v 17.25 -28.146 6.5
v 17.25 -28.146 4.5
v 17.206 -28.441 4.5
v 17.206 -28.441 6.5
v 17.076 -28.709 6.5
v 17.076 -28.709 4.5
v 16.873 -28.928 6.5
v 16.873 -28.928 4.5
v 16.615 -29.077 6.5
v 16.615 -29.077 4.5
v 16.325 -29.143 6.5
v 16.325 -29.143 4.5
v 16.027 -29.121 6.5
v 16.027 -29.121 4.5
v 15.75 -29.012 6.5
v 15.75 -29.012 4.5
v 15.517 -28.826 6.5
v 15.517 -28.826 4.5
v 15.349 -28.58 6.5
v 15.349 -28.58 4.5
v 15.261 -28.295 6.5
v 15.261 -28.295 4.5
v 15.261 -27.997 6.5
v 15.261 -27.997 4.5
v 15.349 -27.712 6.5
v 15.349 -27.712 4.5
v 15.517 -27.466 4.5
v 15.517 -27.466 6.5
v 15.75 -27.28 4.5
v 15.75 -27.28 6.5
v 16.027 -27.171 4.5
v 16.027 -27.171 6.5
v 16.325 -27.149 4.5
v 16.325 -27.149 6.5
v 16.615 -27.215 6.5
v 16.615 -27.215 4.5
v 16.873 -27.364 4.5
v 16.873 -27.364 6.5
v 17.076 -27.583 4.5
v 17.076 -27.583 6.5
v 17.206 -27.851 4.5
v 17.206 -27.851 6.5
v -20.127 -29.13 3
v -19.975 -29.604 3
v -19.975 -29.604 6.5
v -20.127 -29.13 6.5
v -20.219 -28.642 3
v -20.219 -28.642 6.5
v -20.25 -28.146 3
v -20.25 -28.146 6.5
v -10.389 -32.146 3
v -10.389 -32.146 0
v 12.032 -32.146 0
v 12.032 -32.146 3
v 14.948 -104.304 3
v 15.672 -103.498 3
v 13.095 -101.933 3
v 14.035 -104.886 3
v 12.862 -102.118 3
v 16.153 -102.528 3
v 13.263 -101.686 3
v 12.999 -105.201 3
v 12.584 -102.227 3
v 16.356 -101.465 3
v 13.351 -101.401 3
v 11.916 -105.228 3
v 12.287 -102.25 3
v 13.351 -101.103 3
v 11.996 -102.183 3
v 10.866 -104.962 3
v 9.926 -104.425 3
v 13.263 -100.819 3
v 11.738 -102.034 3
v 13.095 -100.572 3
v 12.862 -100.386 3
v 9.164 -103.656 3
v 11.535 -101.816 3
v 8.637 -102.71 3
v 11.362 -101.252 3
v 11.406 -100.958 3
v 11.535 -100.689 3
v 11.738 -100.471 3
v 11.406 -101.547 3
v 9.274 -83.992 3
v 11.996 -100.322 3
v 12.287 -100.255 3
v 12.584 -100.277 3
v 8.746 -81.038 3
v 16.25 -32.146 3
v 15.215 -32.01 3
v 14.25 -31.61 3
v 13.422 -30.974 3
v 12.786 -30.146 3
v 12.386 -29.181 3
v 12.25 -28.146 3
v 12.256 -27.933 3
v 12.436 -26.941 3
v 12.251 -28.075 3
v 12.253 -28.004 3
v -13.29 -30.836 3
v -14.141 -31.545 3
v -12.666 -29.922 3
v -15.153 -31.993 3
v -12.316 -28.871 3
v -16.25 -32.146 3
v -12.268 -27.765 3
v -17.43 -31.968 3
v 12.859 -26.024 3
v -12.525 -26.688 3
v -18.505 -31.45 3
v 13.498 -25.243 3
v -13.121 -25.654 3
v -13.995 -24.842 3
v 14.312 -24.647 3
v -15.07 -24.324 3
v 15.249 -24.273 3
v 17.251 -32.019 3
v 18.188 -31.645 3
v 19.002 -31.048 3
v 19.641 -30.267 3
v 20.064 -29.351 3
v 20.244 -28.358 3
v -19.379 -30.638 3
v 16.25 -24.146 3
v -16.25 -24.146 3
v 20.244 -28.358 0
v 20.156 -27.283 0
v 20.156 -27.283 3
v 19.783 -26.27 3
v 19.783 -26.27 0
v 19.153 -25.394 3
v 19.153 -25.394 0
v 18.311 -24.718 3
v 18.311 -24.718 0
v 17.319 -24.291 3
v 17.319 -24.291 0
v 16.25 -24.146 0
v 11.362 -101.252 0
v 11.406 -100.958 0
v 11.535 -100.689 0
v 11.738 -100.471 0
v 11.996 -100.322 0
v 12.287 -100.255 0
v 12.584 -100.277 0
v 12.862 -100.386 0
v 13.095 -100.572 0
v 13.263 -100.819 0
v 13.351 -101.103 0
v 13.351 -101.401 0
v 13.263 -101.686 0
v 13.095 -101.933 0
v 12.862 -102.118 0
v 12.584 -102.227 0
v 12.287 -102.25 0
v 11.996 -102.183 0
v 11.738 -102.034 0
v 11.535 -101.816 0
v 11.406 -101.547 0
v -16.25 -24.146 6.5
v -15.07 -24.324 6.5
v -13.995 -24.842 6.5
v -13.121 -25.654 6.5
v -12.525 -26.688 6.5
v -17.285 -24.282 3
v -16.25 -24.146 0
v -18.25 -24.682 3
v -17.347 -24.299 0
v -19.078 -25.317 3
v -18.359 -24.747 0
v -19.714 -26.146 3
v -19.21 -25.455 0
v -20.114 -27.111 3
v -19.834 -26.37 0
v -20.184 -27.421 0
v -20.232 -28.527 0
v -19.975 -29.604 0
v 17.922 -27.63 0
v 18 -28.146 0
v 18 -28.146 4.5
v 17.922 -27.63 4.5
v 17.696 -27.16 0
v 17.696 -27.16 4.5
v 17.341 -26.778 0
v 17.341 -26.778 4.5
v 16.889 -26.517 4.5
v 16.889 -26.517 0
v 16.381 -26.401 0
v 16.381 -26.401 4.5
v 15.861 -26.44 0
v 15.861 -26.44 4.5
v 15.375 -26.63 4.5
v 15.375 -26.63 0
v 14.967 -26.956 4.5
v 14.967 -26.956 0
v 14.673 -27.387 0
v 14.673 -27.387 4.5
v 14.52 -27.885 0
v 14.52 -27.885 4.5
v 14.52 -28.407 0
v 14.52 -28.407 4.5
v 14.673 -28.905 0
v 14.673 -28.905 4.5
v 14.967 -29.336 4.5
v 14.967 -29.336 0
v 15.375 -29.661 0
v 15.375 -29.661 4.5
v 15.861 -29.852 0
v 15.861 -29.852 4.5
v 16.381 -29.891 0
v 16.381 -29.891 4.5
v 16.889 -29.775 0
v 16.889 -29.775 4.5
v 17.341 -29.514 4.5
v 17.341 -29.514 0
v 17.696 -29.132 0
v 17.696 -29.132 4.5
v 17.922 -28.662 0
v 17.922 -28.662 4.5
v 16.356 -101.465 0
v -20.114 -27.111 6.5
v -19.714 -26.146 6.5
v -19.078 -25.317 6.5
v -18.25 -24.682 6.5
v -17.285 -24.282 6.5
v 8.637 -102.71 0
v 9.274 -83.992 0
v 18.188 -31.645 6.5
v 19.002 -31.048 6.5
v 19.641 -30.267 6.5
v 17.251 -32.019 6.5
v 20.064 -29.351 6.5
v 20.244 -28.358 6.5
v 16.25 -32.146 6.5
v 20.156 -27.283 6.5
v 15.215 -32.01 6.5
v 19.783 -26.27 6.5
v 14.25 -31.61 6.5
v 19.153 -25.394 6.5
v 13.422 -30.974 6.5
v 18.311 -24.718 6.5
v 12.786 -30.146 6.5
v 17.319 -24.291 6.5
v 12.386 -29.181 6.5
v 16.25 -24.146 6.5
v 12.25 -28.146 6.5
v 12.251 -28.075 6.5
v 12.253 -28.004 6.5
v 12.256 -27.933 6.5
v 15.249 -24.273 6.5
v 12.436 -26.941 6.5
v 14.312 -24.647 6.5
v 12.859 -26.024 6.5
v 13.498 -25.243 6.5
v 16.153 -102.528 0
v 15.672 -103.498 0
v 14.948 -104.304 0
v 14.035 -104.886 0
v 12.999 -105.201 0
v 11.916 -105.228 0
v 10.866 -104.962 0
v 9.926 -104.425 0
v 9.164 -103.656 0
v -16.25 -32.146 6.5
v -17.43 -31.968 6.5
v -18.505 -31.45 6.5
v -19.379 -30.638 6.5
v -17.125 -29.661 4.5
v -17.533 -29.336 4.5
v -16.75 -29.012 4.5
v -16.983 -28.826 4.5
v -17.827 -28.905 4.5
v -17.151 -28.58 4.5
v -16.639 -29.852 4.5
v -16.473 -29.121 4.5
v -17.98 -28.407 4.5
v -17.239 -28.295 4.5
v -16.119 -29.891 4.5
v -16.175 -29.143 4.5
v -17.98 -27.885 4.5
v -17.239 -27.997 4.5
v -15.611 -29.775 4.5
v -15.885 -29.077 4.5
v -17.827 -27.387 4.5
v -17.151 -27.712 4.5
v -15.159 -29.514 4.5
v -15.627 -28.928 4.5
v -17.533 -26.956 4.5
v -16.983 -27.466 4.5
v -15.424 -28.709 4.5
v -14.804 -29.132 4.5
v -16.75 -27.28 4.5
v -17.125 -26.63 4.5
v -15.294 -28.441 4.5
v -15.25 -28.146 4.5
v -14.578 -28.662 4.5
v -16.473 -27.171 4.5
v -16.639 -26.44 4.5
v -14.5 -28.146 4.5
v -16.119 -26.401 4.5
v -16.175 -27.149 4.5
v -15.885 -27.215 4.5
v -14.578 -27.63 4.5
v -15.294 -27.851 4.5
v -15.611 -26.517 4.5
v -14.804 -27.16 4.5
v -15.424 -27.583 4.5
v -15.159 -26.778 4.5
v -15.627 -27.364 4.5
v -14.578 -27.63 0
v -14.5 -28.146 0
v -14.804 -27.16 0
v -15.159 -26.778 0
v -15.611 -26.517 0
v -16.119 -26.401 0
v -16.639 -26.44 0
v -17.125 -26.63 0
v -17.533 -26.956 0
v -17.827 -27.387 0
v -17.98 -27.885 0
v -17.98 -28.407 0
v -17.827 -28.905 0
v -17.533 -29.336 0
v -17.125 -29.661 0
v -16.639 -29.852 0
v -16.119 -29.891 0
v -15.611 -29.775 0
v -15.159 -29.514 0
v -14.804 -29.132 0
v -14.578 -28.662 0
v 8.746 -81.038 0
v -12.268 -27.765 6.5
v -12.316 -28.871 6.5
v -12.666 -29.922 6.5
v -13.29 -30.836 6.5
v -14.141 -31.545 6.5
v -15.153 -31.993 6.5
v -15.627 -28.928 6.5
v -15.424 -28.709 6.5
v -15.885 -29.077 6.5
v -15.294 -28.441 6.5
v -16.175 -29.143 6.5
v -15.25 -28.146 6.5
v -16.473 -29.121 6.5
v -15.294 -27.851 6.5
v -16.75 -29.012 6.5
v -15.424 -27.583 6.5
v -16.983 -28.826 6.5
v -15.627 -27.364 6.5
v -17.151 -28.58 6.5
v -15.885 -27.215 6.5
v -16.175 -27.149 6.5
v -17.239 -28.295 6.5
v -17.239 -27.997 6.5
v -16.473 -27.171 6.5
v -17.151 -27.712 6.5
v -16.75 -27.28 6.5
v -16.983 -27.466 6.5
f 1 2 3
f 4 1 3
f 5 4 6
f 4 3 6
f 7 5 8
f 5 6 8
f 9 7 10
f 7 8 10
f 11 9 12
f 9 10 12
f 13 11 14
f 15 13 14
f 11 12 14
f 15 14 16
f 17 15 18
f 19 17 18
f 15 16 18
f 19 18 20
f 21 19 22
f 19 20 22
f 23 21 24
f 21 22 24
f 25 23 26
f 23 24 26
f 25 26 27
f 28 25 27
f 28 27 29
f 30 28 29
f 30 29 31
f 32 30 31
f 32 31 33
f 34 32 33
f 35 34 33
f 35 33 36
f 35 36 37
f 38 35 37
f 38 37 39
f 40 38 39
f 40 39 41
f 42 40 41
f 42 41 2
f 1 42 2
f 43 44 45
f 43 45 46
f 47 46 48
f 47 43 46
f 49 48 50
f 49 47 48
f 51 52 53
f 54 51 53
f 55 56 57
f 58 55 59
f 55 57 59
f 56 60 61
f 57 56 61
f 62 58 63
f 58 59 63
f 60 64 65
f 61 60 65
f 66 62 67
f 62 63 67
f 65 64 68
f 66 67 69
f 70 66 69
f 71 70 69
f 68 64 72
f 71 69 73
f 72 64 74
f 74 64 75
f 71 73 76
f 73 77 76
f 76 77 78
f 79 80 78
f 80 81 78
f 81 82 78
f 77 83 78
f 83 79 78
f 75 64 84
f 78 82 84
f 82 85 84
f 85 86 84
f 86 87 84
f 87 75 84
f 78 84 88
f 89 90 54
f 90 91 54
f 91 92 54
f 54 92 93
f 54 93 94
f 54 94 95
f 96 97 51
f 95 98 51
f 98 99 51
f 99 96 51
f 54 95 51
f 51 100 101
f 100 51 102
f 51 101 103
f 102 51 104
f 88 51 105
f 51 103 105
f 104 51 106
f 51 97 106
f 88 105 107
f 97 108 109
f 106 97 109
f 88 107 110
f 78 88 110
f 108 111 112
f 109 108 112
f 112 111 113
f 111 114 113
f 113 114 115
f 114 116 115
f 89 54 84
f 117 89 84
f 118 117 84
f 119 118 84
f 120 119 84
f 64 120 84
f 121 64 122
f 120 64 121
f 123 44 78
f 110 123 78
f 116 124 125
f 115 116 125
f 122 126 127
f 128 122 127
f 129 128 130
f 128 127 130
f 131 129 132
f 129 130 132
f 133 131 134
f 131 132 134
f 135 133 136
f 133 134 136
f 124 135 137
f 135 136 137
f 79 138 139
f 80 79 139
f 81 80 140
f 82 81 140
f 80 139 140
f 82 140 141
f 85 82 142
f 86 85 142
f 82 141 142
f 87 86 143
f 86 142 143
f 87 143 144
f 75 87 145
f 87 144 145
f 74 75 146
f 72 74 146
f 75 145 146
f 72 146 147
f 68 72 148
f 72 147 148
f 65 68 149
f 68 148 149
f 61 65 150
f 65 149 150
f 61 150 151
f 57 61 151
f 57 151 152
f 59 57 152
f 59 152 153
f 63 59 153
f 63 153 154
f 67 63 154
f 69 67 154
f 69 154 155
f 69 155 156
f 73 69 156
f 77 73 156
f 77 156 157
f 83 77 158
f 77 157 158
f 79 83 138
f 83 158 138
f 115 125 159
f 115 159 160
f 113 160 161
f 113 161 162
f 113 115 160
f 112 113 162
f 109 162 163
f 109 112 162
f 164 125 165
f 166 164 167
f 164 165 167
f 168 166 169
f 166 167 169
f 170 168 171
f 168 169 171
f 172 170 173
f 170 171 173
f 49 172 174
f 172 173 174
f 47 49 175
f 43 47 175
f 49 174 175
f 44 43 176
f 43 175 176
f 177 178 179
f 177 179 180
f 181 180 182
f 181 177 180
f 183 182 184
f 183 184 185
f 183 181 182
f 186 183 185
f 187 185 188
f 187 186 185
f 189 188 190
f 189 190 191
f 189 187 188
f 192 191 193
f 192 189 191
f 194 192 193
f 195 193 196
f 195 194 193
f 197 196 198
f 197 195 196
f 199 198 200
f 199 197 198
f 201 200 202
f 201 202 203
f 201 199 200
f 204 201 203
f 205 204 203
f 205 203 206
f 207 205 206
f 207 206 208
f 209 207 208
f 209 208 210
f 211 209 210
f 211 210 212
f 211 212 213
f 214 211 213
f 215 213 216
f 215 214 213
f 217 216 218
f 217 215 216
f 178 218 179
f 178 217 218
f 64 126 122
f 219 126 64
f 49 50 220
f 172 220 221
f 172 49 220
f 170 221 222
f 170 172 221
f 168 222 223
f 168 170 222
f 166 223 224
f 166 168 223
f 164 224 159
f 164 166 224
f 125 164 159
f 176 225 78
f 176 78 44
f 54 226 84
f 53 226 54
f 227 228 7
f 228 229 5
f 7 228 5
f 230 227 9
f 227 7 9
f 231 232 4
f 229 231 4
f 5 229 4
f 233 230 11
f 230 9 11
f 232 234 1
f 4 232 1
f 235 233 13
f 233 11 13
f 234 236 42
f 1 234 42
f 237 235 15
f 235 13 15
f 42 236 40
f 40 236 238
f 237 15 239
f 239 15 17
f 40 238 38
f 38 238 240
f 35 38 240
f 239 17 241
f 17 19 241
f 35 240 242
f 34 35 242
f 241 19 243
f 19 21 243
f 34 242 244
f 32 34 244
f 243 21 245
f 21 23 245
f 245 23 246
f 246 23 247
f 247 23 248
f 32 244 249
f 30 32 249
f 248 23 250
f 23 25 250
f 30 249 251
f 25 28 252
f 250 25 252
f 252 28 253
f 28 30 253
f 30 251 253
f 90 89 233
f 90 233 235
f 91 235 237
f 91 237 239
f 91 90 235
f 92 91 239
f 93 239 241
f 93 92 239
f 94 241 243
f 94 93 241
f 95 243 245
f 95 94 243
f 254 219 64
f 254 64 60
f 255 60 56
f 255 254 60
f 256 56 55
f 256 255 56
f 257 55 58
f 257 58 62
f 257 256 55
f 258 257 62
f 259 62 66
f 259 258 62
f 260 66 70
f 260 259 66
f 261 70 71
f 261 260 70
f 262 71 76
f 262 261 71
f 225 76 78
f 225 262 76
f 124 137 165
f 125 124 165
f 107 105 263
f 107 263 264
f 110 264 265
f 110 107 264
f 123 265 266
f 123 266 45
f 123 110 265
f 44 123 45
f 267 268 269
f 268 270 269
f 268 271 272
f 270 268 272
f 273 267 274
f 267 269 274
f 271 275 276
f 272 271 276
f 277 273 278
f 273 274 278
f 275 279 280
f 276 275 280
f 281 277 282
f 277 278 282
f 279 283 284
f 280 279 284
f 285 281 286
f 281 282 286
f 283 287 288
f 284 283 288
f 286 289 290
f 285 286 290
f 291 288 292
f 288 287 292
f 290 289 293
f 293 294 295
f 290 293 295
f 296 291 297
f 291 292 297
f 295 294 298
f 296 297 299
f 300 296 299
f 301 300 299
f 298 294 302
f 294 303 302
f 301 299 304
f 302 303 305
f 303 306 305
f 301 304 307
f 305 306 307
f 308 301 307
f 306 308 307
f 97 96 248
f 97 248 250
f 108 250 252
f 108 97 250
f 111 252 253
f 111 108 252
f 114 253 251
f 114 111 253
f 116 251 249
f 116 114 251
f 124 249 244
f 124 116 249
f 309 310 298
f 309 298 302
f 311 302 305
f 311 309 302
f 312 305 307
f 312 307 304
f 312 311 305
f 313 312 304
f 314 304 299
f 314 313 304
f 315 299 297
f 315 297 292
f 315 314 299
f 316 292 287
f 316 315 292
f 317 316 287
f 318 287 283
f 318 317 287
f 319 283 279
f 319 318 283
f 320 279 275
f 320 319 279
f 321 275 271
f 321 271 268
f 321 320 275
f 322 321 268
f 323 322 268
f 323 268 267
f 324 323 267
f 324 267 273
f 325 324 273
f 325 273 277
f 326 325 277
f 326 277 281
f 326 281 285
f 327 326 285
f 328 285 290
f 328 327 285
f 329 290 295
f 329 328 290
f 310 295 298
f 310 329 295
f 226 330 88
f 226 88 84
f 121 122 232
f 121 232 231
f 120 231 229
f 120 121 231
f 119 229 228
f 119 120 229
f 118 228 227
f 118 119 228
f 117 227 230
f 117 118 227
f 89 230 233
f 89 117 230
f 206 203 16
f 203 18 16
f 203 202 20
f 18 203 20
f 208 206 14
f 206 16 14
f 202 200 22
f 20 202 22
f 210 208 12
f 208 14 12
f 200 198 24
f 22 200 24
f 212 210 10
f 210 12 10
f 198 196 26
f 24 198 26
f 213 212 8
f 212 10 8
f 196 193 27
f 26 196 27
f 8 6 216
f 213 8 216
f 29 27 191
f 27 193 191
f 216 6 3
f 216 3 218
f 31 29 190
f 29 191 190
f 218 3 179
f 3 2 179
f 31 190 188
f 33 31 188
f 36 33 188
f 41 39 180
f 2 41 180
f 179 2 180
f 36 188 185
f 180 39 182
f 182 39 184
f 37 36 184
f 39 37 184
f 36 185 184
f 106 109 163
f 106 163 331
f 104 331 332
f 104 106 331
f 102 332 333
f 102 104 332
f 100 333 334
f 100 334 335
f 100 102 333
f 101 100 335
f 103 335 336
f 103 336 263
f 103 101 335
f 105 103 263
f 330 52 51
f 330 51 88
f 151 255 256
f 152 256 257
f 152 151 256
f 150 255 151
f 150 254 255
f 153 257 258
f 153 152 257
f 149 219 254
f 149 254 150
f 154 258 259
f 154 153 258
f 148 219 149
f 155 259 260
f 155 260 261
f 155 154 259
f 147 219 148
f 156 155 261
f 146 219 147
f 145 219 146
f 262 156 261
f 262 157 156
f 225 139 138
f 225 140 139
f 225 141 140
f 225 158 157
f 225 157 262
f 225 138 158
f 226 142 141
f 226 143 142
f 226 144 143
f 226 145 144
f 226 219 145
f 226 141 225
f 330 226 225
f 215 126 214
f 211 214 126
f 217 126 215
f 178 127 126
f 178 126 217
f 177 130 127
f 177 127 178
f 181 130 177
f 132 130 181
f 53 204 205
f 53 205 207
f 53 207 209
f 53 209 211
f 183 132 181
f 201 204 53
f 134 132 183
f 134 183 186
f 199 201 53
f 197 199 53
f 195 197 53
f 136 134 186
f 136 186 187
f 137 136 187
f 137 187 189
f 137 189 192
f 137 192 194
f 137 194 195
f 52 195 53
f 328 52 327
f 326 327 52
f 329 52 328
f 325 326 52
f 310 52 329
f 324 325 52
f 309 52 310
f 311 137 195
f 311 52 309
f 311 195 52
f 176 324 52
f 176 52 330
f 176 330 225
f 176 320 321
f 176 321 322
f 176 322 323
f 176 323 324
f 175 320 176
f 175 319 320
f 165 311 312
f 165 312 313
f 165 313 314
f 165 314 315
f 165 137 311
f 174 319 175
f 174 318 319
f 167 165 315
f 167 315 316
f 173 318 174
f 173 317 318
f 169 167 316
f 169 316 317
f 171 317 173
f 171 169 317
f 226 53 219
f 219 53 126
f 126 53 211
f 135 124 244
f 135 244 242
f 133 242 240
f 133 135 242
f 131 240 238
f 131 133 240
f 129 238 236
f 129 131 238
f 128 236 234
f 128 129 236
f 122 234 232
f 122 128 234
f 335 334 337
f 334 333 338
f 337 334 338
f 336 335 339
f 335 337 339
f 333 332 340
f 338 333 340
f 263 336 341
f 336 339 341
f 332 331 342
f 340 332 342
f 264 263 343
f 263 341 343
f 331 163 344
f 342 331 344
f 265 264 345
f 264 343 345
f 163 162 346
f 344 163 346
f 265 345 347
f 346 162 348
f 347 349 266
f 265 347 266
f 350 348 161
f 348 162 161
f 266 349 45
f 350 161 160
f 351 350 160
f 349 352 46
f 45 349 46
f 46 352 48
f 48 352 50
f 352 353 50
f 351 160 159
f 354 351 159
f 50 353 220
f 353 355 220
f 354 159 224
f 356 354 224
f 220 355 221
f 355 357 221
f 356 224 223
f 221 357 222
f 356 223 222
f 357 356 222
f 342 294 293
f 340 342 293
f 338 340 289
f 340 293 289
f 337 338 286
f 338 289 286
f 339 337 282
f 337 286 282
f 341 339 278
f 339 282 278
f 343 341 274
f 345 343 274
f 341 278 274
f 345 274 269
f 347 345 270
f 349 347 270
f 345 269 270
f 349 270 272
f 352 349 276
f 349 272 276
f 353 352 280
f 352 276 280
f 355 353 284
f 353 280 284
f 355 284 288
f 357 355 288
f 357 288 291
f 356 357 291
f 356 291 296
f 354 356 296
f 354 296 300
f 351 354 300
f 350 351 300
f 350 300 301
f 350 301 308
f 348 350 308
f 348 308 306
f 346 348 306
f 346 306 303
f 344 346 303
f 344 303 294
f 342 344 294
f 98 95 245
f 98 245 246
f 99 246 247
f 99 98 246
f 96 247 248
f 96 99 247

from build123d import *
from build123d.topology import SkipClean

# Parameters (mm, degrees)
SKETCH_1_R          = 1
EXTRUDE_1_DEPTH     = 3
SKETCH_2_R          = 1
EXTRUDE_2_DEPTH     = 3
EXTRUDE_START       = -3
SKETCH_2_5_R        = 1
EXTRUDE_4_DEPTH     = 3.5
SKETCH_1_6_R        = 1.75
CUT_EXTRUDE_2_DEPTH = 4.5


with BuildPart() as part:
    # 草图1 → 凸台-拉伸1 (new body)
    with BuildSketch(Plane.XY):
        with BuildLine():
            Line((-16.25, -32.145825623), (16.25, -32.145825623))
            ThreePointArc((16.25, -32.145825623), (20.25, -28.145825623), (16.25, -24.145825623))
            Line((16.25, -24.145825623), (0, -24.145825623))
            Line((0, -24.145825623), (-16.25, -24.145825623))
            ThreePointArc((-16.25, -24.145825623), (-20.25, -28.145825623), (-16.25, -32.145825623))
        make_face()
        with Locations((-16.25, -28.145825623)):
            Circle(SKETCH_1_R, mode=Mode.SUBTRACT)
        with Locations((16.25, -28.145825623)):
            Circle(SKETCH_1_R, mode=Mode.SUBTRACT)
    extrude(amount=EXTRUDE_1_DEPTH)

    # 草图2 → 凸台-拉伸2 (add)
    with BuildSketch(Plane(origin=(0, 0, 0), x_dir=(-1, 0, 0), z_dir=(0, 0, -1))):
        with BuildLine():
            ThreePointArc((-16.356032043, -101.464832065), (-12.998767478, -105.201322829), (-8.636789042, -102.71019202))
            Line((-8.636789042, -102.71019202), (19.97488875, -29.603633498))
            ThreePointArc((19.97488875, -29.603633498), (14.792192125, -31.870714373), (12.52511125, -26.688017748))
            Line((12.52511125, -26.688017748), (-8.745712257, -81.037738685))
            Line((-8.745712257, -81.037738685), (-9.274078909, -83.991512561))
            Line((-9.274078909, -83.991512561), (-12.255645749, -27.933377702))
            ThreePointArc((-12.255645749, -27.933377702), (-16.037552079, -32.140179874), (-20.244354251, -28.358273544))
            Line((-20.244354251, -28.358273544), (-16.356032043, -101.464832065))
        make_face()
        with Locations((-12.361677792, -101.252384145)):
            Circle(SKETCH_2_R, mode=Mode.SUBTRACT)
    extrude(amount=-EXTRUDE_2_DEPTH)

    # 草图2<5> → 凸台-拉伸4 (add)
    # profile 1 of 2: a face of its own
    with SkipClean():  # the faces are left unmerged after this step: merging them gives an invalid solid
        with BuildSketch(Plane(origin=(0, 0, 0), x_dir=(-1, 0, 0), z_dir=(0, 0, -1)).offset(EXTRUDE_START)):
            with BuildLine():
                ThreePointArc((-16.25, -24.145825623), (-19.152567112, -25.393534912), (-20.244354251, -28.358273544))
                ThreePointArc((-20.244354251, -28.358273544), (-19.002290711, -31.048392735), (-16.25, -32.145825623))
                ThreePointArc((-16.25, -32.145825623), (-13.421572875, -30.974252748), (-12.25, -28.145825623))
                ThreePointArc((-12.25, -28.145825623), (-12.251411686, -28.039564161), (-12.255645749, -27.933377702))
                ThreePointArc((-12.255645749, -27.933377702), (-13.497709289, -25.243258511), (-16.25, -24.145825623))
            make_face()
            with Locations(Location((-16.25, -28.145825623, 0), (0, 0, 180))):
                Circle(SKETCH_2_5_R, mode=Mode.SUBTRACT)
        # profile 2 of 2: a face of its own
        with BuildSketch(Plane(origin=(0, 0, 0), x_dir=(-1, 0, 0), z_dir=(0, 0, -1)).offset(EXTRUDE_START)):
            with BuildLine():
                ThreePointArc((16.25, -32.145825623), (18.504857922, -31.449704518), (19.97488875, -29.603633498))
                ThreePointArc((19.97488875, -29.603633498), (20.180620498, -28.887595466), (20.25, -28.145825623))
                ThreePointArc((20.25, -28.145825623), (19.078427125, -25.317398498), (16.25, -24.145825623))
                ThreePointArc((16.25, -24.145825623), (13.995142078, -24.841946728), (12.52511125, -26.688017748))
                ThreePointArc((12.52511125, -26.688017748), (12.946121105, -30.400683545), (16.25, -32.145825623))
            make_face()
            with Locations(Location((16.25, -28.145825623, 0), (0, 0, 180))):
                Circle(SKETCH_2_5_R, mode=Mode.SUBTRACT)
        extrude(amount=-EXTRUDE_4_DEPTH)

    # 草图1<6> → 切除-拉伸2 (cut)
    with SkipClean():  # the faces are left unmerged after this step: merging them gives an invalid solid
        with BuildSketch(Plane.XY):
            with Locations((-16.25, -28.145825623)):
                Circle(SKETCH_1_6_R)
            with Locations((16.25, -28.145825623)):
                Circle(SKETCH_1_6_R)
        extrude(amount=CUT_EXTRUDE_2_DEPTH, mode=Mode.SUBTRACT)


solid = part.part
